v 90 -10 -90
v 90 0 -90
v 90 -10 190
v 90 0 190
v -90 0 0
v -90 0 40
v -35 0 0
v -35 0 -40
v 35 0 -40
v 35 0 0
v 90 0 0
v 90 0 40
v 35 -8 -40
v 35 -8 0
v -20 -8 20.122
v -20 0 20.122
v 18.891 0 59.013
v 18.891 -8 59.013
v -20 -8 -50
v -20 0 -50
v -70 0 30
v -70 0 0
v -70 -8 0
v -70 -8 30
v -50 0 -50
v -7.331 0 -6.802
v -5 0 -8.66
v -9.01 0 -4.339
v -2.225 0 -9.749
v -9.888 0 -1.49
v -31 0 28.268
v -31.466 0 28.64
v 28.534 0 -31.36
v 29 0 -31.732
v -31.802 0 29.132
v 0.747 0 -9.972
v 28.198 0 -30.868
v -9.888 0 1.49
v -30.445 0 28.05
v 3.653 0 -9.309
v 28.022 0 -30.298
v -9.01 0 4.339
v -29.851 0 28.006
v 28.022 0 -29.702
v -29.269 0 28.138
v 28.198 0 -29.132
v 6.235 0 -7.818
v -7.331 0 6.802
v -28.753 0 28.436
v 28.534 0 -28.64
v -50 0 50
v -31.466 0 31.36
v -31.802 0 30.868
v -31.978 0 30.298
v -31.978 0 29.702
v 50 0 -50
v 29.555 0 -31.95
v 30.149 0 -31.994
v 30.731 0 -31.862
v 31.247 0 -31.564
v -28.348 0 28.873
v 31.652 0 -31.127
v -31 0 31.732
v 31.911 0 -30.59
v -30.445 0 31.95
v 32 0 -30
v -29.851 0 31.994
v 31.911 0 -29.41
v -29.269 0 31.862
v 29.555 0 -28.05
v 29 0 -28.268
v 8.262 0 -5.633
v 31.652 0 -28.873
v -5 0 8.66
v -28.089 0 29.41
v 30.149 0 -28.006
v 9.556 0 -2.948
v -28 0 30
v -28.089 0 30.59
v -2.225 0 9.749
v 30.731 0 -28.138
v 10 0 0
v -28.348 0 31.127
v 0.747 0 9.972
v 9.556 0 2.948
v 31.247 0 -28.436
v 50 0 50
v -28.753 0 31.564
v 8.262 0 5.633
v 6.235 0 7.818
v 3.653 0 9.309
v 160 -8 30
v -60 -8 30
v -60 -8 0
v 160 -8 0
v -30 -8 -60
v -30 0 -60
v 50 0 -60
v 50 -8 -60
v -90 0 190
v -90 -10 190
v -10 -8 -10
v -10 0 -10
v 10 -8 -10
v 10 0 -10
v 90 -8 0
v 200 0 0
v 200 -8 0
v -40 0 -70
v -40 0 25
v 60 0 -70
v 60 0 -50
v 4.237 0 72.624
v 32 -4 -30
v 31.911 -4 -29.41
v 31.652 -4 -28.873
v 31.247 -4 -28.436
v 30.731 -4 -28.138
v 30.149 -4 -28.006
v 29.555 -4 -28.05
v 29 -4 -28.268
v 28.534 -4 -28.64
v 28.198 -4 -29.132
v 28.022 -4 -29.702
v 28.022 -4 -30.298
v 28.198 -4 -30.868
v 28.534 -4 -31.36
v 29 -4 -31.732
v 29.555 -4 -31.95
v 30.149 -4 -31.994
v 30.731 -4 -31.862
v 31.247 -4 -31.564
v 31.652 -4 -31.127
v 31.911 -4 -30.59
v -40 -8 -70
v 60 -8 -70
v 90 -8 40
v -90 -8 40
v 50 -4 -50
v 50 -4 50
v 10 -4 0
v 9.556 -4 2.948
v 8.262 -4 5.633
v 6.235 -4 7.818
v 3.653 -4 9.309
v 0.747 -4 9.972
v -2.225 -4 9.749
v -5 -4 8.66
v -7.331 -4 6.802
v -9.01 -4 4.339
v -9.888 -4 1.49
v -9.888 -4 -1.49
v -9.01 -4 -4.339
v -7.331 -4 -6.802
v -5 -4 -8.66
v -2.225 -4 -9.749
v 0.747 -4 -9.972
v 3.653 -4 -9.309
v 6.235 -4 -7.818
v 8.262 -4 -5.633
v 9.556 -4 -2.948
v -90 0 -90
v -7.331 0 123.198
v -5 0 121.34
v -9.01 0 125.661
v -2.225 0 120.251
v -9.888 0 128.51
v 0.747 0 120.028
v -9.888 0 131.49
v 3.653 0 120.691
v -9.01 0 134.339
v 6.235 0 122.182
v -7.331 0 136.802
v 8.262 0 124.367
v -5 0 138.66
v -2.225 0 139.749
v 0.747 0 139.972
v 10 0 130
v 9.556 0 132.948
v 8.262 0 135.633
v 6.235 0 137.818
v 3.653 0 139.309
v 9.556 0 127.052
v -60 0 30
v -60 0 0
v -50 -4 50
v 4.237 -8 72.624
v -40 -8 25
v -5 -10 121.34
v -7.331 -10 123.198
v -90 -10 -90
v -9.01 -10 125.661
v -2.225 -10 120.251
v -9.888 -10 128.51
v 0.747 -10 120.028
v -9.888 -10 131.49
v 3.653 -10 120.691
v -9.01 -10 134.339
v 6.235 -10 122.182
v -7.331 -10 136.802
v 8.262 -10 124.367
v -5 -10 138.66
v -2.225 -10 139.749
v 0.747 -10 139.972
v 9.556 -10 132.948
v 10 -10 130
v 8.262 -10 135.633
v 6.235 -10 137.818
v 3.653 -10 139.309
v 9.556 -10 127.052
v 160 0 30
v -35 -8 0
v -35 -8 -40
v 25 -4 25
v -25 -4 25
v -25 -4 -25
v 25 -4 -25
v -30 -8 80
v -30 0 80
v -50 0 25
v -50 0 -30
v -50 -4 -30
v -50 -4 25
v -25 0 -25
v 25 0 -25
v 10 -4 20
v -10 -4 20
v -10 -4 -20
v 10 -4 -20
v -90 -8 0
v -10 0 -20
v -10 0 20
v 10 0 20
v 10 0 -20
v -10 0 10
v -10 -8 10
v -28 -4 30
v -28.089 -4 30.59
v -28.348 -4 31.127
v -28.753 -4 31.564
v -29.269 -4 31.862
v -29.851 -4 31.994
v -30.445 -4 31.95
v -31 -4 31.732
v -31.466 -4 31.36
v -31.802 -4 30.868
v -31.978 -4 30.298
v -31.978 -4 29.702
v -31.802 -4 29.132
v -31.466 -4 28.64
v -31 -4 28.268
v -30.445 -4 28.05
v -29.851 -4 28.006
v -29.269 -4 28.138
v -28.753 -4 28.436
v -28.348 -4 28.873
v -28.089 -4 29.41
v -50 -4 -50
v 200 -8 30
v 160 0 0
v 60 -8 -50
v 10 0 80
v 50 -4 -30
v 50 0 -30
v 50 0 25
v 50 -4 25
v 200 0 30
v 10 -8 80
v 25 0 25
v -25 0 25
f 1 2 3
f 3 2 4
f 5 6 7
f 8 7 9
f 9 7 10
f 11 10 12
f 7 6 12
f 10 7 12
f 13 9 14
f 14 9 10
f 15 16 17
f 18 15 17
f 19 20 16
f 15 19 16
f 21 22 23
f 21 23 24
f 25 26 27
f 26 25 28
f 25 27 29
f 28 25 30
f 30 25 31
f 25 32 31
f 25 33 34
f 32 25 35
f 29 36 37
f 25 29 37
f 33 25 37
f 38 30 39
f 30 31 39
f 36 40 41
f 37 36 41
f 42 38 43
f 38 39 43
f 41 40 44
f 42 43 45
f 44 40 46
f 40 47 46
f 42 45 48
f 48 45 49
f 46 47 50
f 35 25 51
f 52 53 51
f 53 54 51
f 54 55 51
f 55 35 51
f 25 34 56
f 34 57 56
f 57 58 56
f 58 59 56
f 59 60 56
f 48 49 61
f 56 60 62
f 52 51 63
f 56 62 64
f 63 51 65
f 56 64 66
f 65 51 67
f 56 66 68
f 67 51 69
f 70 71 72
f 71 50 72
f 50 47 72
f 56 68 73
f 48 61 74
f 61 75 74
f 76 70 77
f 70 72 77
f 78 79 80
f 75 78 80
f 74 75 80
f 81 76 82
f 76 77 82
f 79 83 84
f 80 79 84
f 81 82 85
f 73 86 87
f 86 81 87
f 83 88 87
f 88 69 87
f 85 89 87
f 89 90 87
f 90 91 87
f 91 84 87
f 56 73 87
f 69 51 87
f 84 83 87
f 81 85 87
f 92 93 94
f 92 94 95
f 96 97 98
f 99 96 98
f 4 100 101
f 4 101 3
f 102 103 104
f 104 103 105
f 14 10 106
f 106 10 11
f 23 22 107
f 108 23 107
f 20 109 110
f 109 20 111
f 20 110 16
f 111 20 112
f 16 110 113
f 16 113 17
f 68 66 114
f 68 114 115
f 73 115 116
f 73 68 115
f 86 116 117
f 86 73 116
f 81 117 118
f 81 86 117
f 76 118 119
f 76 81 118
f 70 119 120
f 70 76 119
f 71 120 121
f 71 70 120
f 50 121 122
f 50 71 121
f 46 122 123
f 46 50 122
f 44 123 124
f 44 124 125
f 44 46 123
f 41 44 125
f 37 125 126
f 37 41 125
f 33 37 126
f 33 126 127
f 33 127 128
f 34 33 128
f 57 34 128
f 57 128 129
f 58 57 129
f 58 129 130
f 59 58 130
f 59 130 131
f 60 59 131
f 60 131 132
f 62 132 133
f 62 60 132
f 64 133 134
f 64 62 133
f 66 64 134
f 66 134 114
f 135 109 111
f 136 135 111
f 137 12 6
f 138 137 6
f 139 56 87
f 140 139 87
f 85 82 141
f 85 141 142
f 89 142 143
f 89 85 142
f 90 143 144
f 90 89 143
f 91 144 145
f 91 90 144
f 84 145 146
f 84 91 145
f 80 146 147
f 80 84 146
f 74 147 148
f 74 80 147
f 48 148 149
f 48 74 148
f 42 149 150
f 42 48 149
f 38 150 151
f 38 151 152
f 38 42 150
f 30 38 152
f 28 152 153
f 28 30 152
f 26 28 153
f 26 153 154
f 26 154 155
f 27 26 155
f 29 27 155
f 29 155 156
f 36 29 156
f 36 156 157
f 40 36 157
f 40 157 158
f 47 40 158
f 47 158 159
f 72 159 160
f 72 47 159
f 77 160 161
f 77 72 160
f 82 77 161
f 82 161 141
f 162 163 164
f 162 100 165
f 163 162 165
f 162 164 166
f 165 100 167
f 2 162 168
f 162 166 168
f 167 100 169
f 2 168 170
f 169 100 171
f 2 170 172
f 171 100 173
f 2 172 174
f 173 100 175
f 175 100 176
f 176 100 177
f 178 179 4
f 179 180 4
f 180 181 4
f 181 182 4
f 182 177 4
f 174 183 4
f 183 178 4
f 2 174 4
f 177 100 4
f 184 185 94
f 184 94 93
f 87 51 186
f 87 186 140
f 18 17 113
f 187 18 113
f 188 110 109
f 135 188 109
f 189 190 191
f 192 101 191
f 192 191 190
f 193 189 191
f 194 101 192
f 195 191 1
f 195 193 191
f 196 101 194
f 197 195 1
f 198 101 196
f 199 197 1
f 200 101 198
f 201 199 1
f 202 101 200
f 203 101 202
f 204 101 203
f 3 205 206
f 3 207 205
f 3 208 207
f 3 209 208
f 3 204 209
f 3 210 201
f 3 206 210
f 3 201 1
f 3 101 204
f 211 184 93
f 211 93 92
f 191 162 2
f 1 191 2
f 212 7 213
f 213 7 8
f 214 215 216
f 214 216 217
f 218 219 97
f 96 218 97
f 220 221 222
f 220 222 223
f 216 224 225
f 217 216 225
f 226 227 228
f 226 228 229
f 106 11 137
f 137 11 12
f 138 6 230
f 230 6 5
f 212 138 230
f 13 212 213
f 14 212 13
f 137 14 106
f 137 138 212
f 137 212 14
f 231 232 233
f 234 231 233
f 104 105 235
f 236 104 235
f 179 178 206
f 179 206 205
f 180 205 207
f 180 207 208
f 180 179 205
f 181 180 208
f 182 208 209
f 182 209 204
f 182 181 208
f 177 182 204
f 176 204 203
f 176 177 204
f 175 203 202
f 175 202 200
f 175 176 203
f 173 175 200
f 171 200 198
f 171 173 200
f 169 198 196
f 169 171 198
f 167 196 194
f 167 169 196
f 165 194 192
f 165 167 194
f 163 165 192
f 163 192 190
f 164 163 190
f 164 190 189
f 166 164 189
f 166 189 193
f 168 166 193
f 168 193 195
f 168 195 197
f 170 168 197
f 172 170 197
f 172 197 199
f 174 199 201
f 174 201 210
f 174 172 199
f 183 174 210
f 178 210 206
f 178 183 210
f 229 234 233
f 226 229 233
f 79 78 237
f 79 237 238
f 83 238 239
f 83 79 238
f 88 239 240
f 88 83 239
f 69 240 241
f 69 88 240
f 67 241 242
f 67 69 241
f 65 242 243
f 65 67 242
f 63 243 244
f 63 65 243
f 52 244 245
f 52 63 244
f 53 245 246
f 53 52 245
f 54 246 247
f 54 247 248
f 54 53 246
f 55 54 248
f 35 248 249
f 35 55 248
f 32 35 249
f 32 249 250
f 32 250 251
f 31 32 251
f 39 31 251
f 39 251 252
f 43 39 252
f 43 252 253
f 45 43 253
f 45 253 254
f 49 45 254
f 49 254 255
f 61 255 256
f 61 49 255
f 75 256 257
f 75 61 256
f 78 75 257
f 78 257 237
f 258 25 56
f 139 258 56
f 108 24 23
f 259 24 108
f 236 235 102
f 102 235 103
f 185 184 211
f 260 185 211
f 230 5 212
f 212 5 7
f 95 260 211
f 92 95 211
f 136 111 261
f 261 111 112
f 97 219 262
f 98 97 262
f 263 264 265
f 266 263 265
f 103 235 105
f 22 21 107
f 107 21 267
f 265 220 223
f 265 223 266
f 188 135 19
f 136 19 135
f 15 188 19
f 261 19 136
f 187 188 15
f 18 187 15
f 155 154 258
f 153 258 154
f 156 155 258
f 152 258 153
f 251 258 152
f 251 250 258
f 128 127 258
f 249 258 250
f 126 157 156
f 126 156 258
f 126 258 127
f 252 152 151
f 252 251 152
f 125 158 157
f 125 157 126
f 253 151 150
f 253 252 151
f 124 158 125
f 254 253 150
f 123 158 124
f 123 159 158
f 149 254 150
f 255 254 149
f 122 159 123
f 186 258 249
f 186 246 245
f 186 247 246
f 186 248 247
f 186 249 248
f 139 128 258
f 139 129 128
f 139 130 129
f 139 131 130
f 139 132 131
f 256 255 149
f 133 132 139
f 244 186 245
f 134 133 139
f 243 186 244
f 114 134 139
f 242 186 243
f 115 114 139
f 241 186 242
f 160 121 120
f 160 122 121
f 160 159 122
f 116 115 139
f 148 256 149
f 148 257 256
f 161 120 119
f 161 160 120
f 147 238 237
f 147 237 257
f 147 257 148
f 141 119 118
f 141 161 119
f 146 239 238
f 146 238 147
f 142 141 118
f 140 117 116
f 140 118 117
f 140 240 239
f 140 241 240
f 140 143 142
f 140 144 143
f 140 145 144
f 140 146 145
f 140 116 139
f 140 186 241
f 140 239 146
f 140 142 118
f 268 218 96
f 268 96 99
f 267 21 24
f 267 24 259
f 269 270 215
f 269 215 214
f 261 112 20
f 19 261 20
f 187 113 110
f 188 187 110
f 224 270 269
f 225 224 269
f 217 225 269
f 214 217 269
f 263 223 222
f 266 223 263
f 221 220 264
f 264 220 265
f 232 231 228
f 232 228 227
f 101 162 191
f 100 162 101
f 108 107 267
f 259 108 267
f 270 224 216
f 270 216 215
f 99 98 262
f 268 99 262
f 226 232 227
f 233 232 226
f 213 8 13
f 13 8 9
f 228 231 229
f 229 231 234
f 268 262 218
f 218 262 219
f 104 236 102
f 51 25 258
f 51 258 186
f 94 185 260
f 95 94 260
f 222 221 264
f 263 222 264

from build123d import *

# Parameters (mm, degrees)
F1_DEPTH  = 8
F2_W      = 220
F2_H      = 30
F3_DEPTH  = 8
F4_W      = 270
F4_H      = 30
F5_DEPTH  = 8
F6_W      = 180
F6_H      = 280
F6_R      = 10
F7_DEPTH  = 10
F8_W      = 100
F8_H      = 55
F9_DEPTH  = 4
F10_W     = 100
F10_H     = 100
F10_R     = 2
F10_R_2   = 10
F11_DEPTH = 4
F13_DEPTH = 8
F15_DEPTH = 8
F16_W     = 50
F16_H     = 50
F17_DEPTH = 4
F19_DEPTH = 8
F20_W     = 20
F20_H     = 40
F21_DEPTH = 4


with BuildPart() as f1:
    # F0 (on Front) → F1 (new body)
    with BuildSketch(Plane.XZ):
        Polygon((-30, 80), (-30, -60), (50, -60), (10, 80), align=None)
    extrude(amount=F1_DEPTH)


with BuildPart() as f3:
    # F2 (on Front) → F3 (new body)
    with BuildSketch(Plane.XZ):
        with Locations((50, 15)):
            Rectangle(F2_W, F2_H)
    extrude(amount=F3_DEPTH)


with BuildPart() as f5:
    # F4 (on Front) → F5 (new body)
    with BuildSketch(Plane.XZ):
        with Locations((64.999996, 15)):
            Rectangle(F4_W, F4_H)
    extrude(amount=F5_DEPTH)


with BuildPart() as f7:
    # F6 (on Front) → F7 (new body)
    with BuildSketch(Plane.XZ):
        with Locations((0, 50)):
            Rectangle(F6_W, F6_H)
        with Locations((0, 130)):
            Circle(F6_R, mode=Mode.SUBTRACT)
    extrude(amount=F7_DEPTH)


with BuildPart() as f9:
    # F8 (on Front) → F9 (new body)
    with BuildSketch(Plane.XZ):
        with Locations((0, -2.5)):
            Rectangle(F8_W, F8_H)
    extrude(amount=F9_DEPTH)


with BuildPart() as f11:
    # F10 (on Front) → F11 (new body)
    with BuildSketch(Plane.XZ):
        Rectangle(F10_W, F10_H)
        with Locations((30, -30)):
            Circle(F10_R, mode=Mode.SUBTRACT)
        with Locations((-30, 30)):
            Circle(F10_R, mode=Mode.SUBTRACT)
        Circle(F10_R_2, mode=Mode.SUBTRACT)
    extrude(amount=F11_DEPTH)


with BuildPart() as f13:
    # F12 (on Front) → F13 (new body)
    with BuildSketch(Plane.XZ):
        Polygon((-35, 0), (-35, -40), (35, -40), (35, 0), (90, 0), (90, 40), (-90, 40), (-90, 0), align=None)
    extrude(amount=F13_DEPTH)


with BuildPart() as f15:
    # F14 (on Front) → F15 (new body)
    with BuildSketch(Plane.XZ):
        Polygon((60, -70), (60, -50), (-20, -50), (-20, 20.121846), (18.890873, 59.012719), (4.237276, 72.624189), (-40, 25), (-40, -70), align=None)
    extrude(amount=F15_DEPTH)


with BuildPart() as f17:
    # F16 (on Front) → F17 (new body)
    with BuildSketch(Plane.XZ):
        Rectangle(F16_W, F16_H)
    extrude(amount=F17_DEPTH)


with BuildPart() as f19:
    # F18 (on Front) → F19 (new body)
    with BuildSketch(Plane.XZ):
        Polygon((-10, 10), (-10, -10), (10, -10), align=None)
    extrude(amount=F19_DEPTH)


with BuildPart() as f21:
    # F20 (on Front) → F21 (new body)
    with BuildSketch(Plane.XZ):
        Rectangle(F20_W, F20_H)
    extrude(amount=F21_DEPTH)


solid = Compound([f1.part, f3.part, f5.part, f7.part, f9.part, f11.part, f13.part, f15.part, f17.part, f19.part, f21.part])
